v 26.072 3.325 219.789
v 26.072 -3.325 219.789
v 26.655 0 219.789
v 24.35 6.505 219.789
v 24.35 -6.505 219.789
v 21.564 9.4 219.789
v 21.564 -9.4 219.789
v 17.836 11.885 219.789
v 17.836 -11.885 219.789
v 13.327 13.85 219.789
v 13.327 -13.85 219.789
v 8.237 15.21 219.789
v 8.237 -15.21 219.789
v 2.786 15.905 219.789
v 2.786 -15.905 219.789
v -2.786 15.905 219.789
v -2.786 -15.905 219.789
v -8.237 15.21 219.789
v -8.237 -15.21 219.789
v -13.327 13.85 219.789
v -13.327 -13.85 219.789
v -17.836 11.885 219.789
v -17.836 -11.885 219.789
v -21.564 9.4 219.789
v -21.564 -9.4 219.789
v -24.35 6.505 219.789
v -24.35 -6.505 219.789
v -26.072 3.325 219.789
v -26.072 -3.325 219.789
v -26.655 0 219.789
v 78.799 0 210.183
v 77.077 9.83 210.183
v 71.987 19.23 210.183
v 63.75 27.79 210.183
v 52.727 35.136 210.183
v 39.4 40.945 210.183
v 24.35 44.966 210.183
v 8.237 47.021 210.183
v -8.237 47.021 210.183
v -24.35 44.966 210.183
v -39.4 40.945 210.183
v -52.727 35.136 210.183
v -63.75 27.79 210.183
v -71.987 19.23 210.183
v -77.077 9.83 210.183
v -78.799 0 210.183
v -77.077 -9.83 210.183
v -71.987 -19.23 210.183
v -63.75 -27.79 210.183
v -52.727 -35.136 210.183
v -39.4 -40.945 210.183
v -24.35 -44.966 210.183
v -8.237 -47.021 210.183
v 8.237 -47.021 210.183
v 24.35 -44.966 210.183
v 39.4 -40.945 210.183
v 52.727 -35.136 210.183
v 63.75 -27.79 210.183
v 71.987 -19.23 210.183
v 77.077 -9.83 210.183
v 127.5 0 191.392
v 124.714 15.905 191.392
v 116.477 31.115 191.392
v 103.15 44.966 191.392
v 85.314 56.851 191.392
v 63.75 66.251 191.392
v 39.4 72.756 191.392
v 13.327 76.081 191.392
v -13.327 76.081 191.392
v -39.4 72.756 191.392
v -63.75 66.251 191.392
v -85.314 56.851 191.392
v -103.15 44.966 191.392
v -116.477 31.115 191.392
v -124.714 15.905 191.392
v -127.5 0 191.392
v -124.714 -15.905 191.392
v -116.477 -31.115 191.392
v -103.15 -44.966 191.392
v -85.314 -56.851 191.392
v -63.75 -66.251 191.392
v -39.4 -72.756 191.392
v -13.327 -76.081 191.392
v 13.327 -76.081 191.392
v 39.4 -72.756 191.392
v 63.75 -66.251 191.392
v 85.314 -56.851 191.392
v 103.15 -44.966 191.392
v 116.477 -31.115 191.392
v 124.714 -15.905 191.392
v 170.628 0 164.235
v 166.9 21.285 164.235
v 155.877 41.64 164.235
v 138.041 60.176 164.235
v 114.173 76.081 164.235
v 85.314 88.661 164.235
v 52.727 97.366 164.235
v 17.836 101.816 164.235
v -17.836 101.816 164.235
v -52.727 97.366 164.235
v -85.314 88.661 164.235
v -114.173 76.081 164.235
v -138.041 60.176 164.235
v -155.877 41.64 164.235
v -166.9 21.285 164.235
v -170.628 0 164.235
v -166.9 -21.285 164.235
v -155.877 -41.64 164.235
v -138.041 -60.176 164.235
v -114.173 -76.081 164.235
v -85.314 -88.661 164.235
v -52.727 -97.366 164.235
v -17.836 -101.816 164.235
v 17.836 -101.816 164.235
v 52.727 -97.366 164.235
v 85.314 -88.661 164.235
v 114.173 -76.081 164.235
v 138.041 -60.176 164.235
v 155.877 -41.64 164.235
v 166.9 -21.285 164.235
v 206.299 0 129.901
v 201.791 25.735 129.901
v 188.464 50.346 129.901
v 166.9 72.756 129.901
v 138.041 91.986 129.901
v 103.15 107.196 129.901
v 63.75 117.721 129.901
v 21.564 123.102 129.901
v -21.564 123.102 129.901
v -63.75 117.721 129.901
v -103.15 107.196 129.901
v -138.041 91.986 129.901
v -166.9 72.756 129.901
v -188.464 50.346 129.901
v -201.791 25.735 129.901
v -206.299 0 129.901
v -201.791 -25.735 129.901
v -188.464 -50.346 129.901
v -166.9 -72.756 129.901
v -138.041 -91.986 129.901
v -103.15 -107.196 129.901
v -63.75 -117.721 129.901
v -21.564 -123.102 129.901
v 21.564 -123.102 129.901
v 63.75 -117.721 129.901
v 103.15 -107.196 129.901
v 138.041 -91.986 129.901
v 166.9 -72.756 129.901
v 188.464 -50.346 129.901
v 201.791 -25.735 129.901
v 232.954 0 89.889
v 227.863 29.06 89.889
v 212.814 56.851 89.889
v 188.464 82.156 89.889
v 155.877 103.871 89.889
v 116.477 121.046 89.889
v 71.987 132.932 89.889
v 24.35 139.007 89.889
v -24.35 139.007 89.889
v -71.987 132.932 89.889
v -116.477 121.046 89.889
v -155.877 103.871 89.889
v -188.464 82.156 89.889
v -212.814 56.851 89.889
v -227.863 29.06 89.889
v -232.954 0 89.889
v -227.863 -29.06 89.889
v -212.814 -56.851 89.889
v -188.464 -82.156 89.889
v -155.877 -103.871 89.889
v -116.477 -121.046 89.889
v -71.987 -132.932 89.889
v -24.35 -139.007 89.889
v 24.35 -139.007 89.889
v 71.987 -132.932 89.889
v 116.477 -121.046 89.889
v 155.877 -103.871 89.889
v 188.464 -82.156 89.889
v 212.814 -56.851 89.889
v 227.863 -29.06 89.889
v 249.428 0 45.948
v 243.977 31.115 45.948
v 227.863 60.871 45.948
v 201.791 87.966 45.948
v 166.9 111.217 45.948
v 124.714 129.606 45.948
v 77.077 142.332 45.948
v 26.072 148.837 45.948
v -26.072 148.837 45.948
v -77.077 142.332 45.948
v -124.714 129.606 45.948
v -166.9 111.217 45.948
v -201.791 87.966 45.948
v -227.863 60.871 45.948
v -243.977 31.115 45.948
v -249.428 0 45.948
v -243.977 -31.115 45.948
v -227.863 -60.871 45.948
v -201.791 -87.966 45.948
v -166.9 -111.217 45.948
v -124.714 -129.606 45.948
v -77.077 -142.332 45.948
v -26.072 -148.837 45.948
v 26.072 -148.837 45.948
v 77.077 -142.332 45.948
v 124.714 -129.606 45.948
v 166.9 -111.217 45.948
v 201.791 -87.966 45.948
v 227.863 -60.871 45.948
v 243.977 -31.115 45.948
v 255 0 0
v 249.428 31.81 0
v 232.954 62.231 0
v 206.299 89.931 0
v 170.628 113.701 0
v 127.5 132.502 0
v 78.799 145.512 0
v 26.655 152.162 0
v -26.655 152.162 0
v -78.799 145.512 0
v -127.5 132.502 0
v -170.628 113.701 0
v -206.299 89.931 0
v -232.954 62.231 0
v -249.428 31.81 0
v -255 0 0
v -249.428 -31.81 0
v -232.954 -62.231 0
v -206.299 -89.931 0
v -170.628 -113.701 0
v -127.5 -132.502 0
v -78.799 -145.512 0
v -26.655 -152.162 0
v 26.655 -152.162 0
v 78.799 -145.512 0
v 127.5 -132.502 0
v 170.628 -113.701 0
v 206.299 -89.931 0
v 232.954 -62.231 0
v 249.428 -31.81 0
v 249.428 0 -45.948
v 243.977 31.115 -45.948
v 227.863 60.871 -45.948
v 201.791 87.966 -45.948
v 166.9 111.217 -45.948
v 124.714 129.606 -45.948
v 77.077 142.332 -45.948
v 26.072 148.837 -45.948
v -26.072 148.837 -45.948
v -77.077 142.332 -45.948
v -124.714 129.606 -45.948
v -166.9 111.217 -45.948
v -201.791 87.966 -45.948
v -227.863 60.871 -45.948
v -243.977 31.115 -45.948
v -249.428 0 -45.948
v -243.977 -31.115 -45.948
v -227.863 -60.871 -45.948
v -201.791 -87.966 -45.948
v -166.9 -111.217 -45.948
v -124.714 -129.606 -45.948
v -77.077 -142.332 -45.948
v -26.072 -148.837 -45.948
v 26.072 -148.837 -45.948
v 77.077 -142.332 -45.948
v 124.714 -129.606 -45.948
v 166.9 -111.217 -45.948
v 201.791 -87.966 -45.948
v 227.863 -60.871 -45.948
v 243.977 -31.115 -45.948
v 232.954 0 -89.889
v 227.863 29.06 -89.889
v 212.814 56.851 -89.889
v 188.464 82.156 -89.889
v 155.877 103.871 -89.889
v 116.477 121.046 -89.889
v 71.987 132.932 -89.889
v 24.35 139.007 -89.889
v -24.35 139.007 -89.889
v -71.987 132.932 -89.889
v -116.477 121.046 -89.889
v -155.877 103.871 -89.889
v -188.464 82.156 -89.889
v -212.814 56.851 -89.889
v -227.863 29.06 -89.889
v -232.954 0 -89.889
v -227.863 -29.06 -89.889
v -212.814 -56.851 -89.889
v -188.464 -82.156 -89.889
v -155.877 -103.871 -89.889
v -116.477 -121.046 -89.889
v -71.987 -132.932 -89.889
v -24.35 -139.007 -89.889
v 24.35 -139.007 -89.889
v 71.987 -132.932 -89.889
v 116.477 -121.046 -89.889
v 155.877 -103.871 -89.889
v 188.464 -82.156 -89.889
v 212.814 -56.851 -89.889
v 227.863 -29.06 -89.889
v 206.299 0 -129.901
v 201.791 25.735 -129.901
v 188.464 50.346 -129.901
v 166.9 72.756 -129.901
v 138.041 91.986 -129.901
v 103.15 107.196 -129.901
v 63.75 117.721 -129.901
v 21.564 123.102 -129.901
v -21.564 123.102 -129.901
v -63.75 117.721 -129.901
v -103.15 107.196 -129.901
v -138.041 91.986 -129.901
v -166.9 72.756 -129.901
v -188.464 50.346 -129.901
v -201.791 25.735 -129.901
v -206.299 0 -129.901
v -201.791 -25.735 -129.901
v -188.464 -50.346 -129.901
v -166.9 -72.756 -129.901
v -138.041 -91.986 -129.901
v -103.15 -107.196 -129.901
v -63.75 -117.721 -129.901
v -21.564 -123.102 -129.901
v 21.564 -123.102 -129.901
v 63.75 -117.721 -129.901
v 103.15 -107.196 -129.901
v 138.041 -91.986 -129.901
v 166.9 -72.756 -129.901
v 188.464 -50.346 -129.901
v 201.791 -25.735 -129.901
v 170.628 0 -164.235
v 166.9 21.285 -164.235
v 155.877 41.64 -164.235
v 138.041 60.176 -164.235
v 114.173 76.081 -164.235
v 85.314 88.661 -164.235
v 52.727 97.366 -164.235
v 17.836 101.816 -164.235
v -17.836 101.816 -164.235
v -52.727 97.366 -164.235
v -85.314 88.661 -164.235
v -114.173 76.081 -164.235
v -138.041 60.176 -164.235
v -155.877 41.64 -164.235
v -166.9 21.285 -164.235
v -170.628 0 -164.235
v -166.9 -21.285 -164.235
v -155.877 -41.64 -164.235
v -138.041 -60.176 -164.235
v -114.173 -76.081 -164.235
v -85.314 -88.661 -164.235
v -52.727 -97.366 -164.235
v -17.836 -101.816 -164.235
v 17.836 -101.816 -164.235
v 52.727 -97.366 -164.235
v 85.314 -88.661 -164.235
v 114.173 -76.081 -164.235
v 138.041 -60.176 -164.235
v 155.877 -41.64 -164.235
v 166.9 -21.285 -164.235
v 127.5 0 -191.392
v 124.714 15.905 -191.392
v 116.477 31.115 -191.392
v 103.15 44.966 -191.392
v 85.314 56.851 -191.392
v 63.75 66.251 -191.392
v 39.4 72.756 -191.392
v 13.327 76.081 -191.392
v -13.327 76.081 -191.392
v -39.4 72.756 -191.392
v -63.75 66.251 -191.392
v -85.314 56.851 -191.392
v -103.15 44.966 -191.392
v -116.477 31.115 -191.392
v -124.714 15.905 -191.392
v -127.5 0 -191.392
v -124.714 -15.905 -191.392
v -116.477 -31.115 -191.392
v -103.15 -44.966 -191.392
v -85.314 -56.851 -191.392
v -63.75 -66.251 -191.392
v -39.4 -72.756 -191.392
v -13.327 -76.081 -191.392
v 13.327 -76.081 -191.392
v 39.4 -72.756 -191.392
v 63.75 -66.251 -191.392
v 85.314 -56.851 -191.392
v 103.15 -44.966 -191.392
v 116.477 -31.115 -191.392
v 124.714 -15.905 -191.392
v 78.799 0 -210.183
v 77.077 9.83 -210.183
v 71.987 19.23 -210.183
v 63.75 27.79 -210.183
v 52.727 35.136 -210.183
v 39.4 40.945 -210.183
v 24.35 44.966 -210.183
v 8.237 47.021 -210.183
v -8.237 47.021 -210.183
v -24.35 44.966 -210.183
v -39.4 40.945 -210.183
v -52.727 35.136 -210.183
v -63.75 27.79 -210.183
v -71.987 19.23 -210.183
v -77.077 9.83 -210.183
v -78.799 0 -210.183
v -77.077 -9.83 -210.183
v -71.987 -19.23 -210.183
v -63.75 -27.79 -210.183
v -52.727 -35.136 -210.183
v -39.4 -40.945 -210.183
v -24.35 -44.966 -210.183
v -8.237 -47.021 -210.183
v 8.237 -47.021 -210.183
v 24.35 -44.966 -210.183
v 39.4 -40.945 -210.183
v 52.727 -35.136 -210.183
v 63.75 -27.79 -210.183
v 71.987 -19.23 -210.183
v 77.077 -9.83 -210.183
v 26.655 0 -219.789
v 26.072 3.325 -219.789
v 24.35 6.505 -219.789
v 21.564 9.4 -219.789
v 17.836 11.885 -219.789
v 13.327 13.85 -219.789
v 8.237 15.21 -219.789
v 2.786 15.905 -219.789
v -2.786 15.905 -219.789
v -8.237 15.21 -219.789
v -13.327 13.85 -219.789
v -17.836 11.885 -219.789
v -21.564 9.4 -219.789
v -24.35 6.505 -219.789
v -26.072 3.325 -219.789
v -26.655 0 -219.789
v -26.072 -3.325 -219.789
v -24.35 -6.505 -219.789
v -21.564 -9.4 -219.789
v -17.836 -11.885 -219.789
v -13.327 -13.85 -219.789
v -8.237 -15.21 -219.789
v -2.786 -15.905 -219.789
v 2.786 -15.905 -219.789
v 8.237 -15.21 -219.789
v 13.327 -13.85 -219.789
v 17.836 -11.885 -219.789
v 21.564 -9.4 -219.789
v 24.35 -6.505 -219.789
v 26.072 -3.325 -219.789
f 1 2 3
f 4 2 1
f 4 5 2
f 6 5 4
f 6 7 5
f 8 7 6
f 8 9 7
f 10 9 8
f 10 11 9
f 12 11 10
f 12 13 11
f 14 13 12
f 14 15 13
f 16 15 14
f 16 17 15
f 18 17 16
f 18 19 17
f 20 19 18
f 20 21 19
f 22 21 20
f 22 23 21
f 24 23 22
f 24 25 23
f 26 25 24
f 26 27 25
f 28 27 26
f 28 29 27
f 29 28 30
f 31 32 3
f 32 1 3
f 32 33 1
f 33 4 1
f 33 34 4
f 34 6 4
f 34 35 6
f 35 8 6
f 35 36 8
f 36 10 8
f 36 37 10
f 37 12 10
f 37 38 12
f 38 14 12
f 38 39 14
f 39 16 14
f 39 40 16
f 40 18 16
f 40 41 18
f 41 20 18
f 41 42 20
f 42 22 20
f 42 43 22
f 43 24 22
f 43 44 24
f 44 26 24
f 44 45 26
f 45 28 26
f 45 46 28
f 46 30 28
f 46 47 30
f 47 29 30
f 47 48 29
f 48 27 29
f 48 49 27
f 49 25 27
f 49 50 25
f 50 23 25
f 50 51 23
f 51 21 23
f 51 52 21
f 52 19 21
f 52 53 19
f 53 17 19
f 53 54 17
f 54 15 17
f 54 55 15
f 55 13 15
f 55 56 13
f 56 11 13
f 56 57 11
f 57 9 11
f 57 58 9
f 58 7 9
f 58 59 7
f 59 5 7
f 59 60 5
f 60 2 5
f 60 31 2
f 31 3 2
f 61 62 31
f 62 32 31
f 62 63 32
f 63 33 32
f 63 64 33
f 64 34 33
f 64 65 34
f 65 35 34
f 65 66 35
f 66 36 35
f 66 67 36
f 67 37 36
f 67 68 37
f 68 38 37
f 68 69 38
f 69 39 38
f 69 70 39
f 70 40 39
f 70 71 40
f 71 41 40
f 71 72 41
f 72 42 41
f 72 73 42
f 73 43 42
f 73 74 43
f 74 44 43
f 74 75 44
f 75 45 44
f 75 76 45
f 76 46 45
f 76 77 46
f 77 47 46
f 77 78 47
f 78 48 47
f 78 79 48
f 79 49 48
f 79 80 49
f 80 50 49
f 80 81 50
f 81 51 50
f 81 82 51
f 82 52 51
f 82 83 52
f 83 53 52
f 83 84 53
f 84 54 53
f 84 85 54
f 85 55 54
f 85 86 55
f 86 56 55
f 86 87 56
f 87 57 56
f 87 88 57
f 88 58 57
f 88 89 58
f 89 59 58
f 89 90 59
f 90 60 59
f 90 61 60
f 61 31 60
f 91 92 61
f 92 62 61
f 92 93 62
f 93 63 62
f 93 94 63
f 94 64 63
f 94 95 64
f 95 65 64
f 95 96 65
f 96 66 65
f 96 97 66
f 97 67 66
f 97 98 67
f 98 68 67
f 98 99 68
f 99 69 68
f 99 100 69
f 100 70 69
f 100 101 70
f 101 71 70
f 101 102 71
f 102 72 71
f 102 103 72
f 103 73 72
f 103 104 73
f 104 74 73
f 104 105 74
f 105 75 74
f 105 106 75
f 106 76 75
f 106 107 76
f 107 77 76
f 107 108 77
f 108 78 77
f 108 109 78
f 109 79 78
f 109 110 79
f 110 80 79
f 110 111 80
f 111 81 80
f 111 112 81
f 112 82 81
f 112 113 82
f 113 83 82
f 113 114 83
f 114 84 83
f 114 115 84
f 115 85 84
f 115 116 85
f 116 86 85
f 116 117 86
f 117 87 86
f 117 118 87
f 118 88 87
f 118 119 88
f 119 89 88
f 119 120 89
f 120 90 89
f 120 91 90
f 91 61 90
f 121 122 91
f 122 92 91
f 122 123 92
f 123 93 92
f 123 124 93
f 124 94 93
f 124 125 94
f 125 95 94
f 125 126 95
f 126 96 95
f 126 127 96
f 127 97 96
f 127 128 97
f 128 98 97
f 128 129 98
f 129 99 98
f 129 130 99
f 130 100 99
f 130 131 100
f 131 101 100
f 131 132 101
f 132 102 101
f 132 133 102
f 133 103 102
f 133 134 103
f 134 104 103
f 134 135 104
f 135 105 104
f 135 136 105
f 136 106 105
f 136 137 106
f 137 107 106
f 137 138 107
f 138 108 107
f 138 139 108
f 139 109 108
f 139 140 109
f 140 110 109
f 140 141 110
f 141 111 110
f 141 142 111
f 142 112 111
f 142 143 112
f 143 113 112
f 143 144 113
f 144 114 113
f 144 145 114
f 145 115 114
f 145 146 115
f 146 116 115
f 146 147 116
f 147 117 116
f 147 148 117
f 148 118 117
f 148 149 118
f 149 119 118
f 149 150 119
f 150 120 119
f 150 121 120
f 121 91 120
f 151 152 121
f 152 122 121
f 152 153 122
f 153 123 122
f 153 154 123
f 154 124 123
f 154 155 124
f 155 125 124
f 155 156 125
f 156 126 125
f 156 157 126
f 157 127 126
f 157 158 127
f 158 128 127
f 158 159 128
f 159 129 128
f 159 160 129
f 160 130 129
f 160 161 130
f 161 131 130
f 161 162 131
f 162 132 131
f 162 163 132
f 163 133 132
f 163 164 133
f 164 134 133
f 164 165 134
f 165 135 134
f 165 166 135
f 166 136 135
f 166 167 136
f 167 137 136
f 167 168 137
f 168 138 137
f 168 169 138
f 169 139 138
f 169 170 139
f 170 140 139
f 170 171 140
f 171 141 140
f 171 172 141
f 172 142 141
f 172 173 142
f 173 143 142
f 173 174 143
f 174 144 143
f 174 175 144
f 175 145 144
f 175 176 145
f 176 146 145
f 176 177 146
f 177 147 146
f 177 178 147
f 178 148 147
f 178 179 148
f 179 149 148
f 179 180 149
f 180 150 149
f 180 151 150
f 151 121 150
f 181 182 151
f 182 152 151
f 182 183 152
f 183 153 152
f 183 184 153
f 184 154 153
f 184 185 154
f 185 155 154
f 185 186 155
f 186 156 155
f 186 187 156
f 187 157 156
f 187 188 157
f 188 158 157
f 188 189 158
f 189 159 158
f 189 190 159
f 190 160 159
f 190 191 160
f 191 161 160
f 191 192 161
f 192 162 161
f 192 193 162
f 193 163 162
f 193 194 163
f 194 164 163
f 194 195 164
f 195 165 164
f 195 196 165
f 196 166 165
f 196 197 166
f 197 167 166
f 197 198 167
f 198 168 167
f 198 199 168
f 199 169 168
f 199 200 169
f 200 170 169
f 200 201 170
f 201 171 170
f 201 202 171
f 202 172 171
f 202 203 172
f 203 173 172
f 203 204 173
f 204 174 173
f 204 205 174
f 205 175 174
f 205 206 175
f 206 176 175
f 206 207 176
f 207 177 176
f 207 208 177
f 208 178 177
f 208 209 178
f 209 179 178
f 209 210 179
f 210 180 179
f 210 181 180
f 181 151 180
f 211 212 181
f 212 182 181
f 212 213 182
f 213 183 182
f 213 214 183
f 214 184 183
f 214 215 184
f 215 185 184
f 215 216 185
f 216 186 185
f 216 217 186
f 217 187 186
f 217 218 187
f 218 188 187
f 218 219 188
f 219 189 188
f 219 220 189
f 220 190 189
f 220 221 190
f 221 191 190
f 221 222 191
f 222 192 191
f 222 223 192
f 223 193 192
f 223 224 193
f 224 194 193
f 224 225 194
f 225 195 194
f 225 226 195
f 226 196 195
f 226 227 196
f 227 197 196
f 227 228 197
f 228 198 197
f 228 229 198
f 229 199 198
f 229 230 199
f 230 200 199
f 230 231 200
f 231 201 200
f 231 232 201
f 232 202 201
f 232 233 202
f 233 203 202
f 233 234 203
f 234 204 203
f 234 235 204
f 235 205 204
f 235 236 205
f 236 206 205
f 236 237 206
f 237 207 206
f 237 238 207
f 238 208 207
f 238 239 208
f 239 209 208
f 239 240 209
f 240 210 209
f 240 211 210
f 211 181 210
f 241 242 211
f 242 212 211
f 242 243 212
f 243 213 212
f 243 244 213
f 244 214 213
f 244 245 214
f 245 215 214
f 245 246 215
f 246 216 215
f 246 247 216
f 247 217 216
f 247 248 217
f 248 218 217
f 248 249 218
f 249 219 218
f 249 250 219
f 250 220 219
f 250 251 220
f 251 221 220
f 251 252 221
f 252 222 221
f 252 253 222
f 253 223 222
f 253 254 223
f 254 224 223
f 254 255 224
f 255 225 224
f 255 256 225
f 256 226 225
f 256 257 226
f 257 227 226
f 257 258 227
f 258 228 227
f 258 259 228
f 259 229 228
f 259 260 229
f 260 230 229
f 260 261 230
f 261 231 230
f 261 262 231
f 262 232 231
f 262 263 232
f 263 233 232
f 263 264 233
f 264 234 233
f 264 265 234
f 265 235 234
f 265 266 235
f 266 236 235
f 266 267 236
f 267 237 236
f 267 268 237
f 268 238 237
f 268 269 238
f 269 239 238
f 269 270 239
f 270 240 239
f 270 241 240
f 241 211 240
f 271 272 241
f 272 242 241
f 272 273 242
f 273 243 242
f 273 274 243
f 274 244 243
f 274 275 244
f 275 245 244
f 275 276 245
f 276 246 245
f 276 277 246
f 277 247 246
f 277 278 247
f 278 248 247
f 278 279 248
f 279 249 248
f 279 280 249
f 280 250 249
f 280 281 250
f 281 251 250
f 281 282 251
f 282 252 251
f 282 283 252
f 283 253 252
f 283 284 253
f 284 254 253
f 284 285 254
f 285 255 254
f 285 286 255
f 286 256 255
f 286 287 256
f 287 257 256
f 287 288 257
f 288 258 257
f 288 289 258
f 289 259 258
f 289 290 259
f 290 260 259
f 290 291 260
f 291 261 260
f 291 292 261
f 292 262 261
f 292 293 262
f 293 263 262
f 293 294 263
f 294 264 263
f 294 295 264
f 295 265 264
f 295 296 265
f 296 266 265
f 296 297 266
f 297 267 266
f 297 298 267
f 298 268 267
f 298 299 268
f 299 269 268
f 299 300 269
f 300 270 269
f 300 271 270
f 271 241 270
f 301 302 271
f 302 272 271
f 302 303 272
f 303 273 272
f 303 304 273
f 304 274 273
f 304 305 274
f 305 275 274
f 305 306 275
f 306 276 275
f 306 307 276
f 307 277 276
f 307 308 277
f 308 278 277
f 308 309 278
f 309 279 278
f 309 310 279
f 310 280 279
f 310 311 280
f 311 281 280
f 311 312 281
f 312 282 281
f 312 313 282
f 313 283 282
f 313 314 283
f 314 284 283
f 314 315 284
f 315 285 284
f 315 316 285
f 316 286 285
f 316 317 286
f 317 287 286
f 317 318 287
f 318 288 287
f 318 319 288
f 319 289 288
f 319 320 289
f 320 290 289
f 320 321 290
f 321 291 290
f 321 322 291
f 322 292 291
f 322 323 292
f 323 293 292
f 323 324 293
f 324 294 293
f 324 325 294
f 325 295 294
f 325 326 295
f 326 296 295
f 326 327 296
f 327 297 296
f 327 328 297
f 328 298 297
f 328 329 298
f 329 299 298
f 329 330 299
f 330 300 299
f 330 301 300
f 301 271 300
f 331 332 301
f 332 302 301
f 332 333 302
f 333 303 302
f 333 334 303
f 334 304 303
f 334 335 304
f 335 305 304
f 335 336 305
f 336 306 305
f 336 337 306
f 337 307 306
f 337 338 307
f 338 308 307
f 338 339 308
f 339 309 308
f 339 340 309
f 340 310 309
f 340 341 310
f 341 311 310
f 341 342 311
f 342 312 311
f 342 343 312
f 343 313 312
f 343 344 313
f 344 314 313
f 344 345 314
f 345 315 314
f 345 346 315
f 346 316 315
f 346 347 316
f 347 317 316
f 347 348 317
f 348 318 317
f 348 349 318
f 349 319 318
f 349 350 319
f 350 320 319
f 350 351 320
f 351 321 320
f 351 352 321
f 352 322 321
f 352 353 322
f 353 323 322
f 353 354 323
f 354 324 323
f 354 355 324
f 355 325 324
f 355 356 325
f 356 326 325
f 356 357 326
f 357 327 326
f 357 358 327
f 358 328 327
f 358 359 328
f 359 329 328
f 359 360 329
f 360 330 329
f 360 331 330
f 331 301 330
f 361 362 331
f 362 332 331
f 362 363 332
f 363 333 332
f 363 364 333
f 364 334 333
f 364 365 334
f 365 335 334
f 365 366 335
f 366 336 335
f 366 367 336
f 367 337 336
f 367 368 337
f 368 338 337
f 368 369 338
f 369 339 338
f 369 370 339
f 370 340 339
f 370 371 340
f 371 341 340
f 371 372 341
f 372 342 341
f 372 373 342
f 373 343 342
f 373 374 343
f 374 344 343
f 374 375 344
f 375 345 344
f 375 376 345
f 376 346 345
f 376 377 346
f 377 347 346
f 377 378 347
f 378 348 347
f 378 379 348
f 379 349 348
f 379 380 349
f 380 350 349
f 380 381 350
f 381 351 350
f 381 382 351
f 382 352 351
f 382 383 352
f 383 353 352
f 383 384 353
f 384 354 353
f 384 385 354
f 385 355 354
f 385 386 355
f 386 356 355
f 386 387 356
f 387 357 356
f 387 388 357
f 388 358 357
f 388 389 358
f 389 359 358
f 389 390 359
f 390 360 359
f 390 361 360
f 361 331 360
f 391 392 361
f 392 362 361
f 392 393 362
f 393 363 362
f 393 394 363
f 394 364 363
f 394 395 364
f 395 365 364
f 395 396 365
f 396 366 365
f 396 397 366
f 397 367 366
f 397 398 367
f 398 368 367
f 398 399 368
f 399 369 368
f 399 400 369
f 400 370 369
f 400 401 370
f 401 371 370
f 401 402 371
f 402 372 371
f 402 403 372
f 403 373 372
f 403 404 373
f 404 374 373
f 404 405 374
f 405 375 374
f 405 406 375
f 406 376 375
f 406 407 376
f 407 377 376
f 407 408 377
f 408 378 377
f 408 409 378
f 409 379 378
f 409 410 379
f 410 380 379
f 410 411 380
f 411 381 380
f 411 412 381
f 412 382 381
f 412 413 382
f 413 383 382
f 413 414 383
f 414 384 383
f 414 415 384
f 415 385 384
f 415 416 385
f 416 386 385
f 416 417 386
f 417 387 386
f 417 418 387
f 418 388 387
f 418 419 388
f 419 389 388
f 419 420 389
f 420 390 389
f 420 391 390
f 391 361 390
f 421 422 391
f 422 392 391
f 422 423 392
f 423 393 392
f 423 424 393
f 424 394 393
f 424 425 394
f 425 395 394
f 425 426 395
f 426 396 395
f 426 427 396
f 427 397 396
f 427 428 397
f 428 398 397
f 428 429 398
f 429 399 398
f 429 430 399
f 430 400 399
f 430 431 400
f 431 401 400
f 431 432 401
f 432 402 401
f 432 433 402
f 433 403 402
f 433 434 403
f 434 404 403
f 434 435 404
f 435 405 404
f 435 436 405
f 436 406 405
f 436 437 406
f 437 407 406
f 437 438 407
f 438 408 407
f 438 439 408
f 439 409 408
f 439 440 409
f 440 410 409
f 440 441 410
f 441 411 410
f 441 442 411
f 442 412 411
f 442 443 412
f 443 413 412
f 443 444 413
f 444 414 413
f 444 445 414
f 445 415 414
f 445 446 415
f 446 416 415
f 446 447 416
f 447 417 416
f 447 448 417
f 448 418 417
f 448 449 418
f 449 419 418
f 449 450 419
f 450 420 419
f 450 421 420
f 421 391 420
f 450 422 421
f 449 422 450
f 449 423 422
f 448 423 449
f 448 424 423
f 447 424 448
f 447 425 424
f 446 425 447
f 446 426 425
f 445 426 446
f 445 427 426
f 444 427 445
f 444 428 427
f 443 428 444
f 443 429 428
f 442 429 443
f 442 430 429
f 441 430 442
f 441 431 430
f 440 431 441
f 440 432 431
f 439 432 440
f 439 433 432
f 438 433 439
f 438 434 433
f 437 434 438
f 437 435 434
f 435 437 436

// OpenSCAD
// Generated by SolidPython 1.0.1 on 2020-07-29 00:46:52


scale(v = [15, 9, 13]) {
	sphere(r = 17);
}
/***********************************************
*********      SolidPython code:      **********
************************************************
 
# import packages: SolidPython
from solid import *
from solid.utils import *
from itertools import chain, combinations, permutations


class Resize:

    def __init__(self, scad_file):
        self.scad_file = scad_file
        #self.scad_file = import_scad(scad_file)
        # cone/cylinder param:
        self.r1 = 0
        self.r2 = 0
        self.h = 0
        # rectangular prism param:
        self.w = 0
        self.l = 0
        # ellipse param:
        self.r = 0

    # import OpenScad code (file name corresponds to shape)


    # classify shape + parameters
    def assign(self, param1, param2, param3):
        if self.scad_file == 'cone.scad':
            self.r1 = param1
            self.r2 = param2
            self.h = param3
        elif self.scad_file == 'cylinder.scad':
            self.r1 = param1
            self.r2 = param2
            self.h = param3
        elif self.scad_file == 'rectangularPrism.scad':
            self.h = param1
            self.l = param2
            self.w = param3
        else:
            self.r = param1
            self.h = param2

    # resize parameters
    def iterate(self):
        x = range(3, 20, 2)
        i = 1
        if self.scad_file == 'cone.scad':
            tempList = list(permutations(x, 2))
            for temp in tempList:
                param1 = temp[0]
                param2 = temp[1]
                filepath = 'produced_scad_files/' + 'cone' + str(param1) + '_' + str(param2) + '_' + '.scad'
                scad_render_to_file(cylinder(h=param1, r1=param2, r2=0), filepath)

        elif self.scad_file == 'cylinder.scad':
            tempList = list(permutations(x, 3))
            for temp in tempList:
                param1 = temp[0]
                param2 = temp[1]
                filepath = 'produced_scad_files/' + 'cylinder' + str(param1) + '_' + str(param2) + '_' + '.scad'
                scad_render_to_file(cylinder(h=param1, r1=param2, r2=param2), filepath)

        elif self.scad_file == 'rectangularPrism.scad':
            tempList = list(permutations(x, 3))
            for temp in tempList:
                param1 = temp[0]
                param2 = temp[1]
                param3 = temp[2]
                filepath = 'produced_scad_files/' + 'rectangularPrism' + str(param1) + '_' + str(param2) + '_' + str(
                    param3) + '.scad'
                scad_render_to_file(cube(size=(param1, param2, param3)), filepath)

        elif self.scad_file == 'ellipse.scad':
            tempList = list(permutations(x, 4))
            for temp in tempList:
                param1 = temp[0]
                param2 = temp[1]
                param3 = temp[2]
                param4 = temp[3]
                filepath = 'produced_scad_files/' + 'ellipse' + str(param1) + '_' + str(param2) + '_' + str(param3) + '_' + str(param4) + '.scad'
                scad_render_to_file(scale([param1, param2, param3])(sphere(r=param4)), filepath)

    def render_to_scadfile(self):
        scad_render_to_file(scad, 'example.scad') 
 
************************************************/
